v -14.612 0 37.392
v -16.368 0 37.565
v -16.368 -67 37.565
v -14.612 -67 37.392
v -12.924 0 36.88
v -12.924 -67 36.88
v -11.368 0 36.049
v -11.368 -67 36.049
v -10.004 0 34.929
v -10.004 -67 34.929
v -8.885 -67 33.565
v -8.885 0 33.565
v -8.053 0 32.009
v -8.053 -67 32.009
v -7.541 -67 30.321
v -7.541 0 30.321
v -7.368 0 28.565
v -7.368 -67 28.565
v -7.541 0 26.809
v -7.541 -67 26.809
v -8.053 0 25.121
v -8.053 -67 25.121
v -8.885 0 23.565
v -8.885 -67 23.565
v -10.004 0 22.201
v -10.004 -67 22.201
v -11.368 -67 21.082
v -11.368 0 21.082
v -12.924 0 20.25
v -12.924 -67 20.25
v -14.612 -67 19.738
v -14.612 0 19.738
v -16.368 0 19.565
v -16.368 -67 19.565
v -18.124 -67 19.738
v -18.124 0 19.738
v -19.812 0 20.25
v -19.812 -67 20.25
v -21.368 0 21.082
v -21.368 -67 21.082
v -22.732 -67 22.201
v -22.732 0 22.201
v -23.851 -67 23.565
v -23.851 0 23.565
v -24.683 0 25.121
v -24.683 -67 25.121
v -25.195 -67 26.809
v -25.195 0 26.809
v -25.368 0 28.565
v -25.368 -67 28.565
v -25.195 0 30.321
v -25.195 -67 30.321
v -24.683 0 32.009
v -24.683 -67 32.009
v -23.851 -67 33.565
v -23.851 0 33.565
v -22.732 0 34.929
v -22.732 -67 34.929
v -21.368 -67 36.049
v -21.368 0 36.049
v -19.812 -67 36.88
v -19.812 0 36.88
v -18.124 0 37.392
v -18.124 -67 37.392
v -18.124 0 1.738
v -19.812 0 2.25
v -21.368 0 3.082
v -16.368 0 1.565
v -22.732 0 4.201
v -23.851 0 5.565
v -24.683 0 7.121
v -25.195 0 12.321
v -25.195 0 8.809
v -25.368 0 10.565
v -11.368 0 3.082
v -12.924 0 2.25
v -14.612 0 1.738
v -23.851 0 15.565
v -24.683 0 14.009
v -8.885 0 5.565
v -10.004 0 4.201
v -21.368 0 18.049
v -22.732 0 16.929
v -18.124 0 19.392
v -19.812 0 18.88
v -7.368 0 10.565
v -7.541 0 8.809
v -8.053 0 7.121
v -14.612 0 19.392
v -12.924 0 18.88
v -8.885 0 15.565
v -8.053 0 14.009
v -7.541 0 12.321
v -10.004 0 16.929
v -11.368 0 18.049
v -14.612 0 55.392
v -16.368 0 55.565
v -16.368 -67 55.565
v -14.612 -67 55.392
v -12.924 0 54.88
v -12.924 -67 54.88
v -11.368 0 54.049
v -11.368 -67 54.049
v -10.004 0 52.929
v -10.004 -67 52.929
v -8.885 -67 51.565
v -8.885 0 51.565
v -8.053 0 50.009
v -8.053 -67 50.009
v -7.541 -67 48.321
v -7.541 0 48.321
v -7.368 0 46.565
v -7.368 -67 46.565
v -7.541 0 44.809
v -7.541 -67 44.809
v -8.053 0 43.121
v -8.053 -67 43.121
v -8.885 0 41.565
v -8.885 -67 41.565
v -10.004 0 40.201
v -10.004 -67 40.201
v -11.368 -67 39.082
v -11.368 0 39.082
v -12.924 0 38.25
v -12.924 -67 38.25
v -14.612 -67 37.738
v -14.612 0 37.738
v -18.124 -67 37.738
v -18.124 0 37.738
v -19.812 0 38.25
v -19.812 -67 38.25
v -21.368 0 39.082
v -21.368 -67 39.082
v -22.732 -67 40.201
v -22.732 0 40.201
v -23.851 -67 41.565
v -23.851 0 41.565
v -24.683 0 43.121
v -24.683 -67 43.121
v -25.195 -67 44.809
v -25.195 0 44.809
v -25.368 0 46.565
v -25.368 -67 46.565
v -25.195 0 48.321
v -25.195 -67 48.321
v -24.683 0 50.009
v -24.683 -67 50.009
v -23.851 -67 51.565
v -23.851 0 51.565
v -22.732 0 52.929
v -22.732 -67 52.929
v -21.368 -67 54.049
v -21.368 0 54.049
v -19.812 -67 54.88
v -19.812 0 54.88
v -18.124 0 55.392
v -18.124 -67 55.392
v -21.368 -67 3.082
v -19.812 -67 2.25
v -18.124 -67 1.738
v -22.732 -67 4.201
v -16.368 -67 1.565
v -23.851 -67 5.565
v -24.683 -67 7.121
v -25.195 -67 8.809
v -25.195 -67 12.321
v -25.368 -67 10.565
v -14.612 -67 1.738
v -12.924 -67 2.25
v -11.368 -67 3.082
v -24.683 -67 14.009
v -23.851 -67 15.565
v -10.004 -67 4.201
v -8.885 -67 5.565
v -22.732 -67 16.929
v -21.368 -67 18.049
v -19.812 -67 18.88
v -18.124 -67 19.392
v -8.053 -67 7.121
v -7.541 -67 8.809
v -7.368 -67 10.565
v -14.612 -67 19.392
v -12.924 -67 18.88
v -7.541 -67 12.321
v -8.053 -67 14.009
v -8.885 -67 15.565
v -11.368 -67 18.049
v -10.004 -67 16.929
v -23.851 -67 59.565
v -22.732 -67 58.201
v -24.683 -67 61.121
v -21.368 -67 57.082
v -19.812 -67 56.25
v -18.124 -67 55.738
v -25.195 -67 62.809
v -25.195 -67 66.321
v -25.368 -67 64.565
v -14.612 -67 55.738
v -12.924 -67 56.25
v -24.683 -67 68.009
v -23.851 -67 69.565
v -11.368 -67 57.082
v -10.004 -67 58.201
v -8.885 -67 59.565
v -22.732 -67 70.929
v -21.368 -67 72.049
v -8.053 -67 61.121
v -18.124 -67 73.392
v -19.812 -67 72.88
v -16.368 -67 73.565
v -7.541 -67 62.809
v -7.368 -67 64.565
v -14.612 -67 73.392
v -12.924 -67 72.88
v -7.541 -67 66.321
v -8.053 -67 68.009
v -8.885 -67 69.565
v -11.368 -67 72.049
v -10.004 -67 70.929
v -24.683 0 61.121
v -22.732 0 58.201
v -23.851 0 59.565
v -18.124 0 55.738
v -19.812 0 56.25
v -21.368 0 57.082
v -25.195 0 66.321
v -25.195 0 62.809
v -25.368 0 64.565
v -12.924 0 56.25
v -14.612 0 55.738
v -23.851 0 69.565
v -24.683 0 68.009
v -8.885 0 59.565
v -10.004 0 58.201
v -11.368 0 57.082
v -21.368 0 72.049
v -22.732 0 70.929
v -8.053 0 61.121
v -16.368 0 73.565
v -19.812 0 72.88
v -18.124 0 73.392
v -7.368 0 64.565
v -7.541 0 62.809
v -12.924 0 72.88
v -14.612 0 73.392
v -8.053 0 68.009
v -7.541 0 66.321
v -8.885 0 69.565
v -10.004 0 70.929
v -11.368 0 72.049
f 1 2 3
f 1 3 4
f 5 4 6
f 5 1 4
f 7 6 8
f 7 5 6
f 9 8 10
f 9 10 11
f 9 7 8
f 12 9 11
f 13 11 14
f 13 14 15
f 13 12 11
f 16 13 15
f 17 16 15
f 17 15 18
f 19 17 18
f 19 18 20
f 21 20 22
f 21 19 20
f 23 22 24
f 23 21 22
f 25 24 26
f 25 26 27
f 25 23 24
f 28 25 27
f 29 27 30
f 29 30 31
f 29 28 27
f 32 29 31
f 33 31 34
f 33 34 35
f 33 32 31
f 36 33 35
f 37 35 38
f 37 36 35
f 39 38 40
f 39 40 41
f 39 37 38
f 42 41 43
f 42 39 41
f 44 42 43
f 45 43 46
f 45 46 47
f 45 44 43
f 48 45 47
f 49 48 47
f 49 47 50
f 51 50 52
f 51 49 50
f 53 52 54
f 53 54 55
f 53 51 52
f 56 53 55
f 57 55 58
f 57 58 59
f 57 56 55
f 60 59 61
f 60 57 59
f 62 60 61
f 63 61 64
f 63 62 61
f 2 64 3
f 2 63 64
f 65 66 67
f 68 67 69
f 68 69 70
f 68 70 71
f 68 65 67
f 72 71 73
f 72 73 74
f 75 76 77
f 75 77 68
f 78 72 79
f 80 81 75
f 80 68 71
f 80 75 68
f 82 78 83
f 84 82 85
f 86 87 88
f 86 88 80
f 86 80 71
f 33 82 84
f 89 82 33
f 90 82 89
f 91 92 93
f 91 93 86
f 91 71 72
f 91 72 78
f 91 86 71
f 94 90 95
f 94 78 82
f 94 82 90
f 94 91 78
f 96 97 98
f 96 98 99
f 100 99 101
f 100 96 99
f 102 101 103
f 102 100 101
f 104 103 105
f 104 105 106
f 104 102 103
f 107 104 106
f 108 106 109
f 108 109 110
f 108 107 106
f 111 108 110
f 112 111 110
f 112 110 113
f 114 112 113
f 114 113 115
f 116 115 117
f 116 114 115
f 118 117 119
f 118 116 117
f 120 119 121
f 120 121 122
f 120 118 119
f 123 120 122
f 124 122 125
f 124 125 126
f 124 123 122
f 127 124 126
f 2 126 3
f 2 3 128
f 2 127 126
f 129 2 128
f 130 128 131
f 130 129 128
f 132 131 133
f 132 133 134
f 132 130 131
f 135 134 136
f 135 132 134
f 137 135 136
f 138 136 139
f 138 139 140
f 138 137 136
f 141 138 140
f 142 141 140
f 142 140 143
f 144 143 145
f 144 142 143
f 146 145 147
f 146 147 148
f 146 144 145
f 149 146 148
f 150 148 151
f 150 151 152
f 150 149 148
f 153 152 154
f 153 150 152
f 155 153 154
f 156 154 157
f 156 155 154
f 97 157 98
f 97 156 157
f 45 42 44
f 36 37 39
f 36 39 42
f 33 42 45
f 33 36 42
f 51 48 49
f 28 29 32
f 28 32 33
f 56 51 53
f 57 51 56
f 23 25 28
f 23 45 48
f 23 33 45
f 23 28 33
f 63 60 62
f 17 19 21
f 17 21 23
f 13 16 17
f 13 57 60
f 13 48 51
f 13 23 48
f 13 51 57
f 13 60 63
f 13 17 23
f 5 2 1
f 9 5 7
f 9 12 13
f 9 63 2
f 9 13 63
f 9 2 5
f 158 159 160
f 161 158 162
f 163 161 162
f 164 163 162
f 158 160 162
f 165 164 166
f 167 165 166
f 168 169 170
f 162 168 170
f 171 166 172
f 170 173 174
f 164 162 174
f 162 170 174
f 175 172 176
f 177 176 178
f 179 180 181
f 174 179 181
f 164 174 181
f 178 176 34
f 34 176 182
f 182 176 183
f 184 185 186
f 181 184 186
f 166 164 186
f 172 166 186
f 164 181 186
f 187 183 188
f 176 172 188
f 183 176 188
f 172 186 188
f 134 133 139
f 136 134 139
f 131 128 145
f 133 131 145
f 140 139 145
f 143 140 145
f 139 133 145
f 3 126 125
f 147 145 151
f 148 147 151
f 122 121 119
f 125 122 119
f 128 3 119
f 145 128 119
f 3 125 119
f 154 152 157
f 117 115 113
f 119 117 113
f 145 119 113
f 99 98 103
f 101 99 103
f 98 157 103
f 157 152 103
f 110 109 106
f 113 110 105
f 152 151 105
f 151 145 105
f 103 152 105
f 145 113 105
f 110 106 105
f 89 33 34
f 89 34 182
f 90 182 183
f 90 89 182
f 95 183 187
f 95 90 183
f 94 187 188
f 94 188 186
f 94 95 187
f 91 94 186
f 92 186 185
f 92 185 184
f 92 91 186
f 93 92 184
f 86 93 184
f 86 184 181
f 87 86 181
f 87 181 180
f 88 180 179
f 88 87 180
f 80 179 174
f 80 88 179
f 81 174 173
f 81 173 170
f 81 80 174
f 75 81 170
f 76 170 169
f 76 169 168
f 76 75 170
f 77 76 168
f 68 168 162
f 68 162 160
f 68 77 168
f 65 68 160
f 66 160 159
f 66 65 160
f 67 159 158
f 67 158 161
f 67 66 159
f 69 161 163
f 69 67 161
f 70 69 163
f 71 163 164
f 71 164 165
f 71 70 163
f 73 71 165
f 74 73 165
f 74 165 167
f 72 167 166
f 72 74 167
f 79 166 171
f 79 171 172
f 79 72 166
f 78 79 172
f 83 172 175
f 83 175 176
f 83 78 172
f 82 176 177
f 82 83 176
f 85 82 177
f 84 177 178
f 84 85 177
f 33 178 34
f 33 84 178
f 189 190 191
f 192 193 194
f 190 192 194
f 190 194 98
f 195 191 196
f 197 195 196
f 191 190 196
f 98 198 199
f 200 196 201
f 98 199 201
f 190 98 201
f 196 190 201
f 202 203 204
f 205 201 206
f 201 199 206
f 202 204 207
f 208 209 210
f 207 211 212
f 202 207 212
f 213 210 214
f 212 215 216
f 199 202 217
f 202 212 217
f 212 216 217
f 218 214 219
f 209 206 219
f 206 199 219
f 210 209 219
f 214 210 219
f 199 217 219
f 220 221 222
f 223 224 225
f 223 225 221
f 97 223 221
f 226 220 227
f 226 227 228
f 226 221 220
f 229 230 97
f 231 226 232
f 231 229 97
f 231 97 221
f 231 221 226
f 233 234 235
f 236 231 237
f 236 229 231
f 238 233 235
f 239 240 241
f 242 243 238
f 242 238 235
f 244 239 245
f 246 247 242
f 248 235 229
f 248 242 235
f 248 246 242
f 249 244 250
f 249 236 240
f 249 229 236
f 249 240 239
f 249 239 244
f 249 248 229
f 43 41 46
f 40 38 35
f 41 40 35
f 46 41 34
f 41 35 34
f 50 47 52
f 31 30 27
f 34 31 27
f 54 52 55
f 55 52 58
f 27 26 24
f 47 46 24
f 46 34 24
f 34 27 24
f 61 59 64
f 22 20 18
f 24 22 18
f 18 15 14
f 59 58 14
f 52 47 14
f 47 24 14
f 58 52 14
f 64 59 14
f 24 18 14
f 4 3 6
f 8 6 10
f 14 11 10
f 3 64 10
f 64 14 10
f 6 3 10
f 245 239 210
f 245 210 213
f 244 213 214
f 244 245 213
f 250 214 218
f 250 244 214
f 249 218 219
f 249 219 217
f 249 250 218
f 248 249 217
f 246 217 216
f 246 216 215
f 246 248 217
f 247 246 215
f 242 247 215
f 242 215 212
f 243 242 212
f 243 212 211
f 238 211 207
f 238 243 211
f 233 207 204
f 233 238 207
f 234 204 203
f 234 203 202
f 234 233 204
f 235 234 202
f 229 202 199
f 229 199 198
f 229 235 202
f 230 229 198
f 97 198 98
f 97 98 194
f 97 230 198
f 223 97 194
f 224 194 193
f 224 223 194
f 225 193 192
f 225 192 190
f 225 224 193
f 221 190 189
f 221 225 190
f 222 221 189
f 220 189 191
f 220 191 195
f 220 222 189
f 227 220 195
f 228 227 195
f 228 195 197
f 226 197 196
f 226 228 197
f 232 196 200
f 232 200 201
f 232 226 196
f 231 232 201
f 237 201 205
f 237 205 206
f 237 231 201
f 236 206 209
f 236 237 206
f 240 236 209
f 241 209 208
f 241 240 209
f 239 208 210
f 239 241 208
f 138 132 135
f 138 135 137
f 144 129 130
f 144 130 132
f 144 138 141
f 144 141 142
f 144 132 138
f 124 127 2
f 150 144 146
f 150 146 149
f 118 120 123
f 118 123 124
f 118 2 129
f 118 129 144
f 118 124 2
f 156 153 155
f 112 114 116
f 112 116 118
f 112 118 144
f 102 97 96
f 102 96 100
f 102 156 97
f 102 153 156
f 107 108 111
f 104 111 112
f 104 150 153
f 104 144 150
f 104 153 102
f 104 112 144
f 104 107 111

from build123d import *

# Parameters (mm, degrees)
SKETCH1_R             = 9
BOSS_EXTRUDE1_DEPTH   = 67
BOSS_EXTRUDE1_2_DEPTH = 67
BOSS_EXTRUDE1_3_DEPTH = 67
BOSS_EXTRUDE1_4_DEPTH = 67


with BuildPart() as part:
    # Sketch1 → Boss-Extrude1 (new body)
    with BuildSketch(Plane(origin=(0, 0, 0), x_dir=(1, 0, 0), z_dir=(0, 1, 0))):
        with Locations((-16.368168457, -64.565274904)):
            Circle(SKETCH1_R)
    extrude(amount=-BOSS_EXTRUDE1_DEPTH)


with BuildPart() as body_2:
    # Sketch1 → Boss-Extrude1 2 (new body)
    with BuildSketch(Plane(origin=(0, 0, 0), x_dir=(1, 0, 0), z_dir=(0, 1, 0))):
        with Locations((-16.368168457, -46.565274904)):
            Circle(SKETCH1_R)
    extrude(amount=-BOSS_EXTRUDE1_2_DEPTH)


with BuildPart() as body_3:
    # Sketch1 → Boss-Extrude1 3 (new body)
    with BuildSketch(Plane(origin=(0, 0, 0), x_dir=(1, 0, 0), z_dir=(0, 1, 0))):
        with Locations((-16.368168457, -28.565274904)):
            Circle(SKETCH1_R)
    extrude(amount=-BOSS_EXTRUDE1_3_DEPTH)


with BuildPart() as body_4:
    # Sketch1 → Boss-Extrude1 4 (new body)
    with BuildSketch(Plane(origin=(0, 0, 0), x_dir=(1, 0, 0), z_dir=(0, 1, 0))):
        with Locations((-16.368168457, -10.565274904)):
            Circle(SKETCH1_R)
    extrude(amount=-BOSS_EXTRUDE1_4_DEPTH)


solid = Compound([part.part, body_2.part, body_3.part, body_4.part])
